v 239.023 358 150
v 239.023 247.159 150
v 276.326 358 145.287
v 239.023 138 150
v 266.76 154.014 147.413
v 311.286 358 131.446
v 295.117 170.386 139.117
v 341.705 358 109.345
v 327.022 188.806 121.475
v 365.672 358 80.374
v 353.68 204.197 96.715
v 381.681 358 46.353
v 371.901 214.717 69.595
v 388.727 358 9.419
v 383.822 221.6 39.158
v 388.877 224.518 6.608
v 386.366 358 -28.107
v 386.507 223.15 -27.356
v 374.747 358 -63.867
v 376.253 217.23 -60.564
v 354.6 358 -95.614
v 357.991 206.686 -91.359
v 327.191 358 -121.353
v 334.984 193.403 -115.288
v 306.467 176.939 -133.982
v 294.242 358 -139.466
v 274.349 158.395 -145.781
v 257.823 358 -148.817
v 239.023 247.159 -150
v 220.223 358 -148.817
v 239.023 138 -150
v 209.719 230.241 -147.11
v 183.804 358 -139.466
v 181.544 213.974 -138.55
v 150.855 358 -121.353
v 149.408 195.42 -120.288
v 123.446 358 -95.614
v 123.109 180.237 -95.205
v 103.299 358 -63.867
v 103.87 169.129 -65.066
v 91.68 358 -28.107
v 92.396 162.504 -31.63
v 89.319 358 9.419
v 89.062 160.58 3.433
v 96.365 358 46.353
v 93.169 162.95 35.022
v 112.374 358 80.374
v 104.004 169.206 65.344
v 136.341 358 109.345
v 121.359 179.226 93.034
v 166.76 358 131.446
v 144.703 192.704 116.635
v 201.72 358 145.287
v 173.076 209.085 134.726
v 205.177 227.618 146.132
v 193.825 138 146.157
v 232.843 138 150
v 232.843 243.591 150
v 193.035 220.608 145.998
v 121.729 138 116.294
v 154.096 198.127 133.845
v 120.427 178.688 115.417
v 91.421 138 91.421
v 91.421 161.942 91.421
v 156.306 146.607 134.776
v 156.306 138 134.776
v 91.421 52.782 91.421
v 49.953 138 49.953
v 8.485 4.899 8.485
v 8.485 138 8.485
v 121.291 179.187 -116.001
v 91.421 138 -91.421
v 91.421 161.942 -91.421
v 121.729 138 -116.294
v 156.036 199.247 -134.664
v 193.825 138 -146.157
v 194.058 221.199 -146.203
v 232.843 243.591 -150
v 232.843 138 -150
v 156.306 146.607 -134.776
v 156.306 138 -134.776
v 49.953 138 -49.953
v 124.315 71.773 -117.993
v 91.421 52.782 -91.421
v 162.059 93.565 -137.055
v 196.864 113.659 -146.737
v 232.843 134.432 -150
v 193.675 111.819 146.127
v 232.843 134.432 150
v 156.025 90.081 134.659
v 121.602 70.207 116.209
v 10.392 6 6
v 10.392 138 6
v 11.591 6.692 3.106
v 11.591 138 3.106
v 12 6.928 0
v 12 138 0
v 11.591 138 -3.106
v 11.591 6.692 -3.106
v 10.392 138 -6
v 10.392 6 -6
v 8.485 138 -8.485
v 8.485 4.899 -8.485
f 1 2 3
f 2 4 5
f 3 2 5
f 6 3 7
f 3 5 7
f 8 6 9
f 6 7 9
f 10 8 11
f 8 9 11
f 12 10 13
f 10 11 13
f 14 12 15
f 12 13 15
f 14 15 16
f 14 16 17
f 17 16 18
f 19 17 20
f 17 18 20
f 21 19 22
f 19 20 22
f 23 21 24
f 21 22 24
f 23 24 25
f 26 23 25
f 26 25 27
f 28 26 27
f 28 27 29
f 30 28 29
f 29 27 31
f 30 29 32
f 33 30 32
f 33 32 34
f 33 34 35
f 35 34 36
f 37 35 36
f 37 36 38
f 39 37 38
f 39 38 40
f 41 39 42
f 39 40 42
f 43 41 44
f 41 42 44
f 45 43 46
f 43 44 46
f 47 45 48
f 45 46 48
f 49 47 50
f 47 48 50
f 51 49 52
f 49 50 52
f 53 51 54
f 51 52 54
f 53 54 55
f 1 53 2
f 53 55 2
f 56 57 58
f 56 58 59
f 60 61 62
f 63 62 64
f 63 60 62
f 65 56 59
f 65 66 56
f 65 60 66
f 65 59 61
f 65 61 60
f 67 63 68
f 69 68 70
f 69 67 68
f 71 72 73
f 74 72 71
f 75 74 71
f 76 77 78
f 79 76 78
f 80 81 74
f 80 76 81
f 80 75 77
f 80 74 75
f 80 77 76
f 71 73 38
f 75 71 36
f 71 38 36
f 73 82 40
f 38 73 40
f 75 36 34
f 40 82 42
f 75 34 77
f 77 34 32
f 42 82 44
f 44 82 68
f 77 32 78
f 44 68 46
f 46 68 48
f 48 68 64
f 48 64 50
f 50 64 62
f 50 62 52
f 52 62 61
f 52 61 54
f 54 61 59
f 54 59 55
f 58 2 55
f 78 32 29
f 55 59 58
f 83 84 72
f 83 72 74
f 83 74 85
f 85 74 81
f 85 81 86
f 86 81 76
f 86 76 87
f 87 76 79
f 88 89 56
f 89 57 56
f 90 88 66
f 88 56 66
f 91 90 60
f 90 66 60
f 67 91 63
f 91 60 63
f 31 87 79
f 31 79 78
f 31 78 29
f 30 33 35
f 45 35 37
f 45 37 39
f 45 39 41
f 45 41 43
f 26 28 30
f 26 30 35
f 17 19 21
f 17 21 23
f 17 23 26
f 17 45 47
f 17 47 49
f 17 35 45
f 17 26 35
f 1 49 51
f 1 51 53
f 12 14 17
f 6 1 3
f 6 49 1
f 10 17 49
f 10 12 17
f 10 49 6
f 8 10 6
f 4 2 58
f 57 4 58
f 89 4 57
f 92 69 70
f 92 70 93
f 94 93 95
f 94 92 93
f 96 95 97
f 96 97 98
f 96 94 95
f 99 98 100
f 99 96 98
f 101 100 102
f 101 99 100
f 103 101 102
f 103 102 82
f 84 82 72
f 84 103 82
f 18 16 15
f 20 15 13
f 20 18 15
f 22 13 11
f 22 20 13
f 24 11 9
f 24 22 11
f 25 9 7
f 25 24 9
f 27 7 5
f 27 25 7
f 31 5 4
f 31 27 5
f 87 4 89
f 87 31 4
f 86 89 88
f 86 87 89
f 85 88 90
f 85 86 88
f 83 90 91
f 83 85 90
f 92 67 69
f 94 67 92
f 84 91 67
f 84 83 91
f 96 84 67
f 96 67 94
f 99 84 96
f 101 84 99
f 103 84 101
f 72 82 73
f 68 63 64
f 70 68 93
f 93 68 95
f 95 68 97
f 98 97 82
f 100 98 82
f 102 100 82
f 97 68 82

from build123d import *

# Parameters (mm, degrees)
BOSS_EXTRUDE1_DEPTH             = 138
SKETCH10_R                      = 150
BOSS_EXTRUDE6_DEPTH             = 220
BOSS_EXTRUDE6_DIRECTION_2_REACH = 314.006
SPLIT3_DEPTH                    = 76
FILLET2_R                       = 200
BOSS_EXTRUDE7_DEPTH             = 109.159437572


with BuildPart() as part:
    # Sketch1 → Boss-Extrude1 (new body)
    with BuildSketch(Plane(origin=(0, 0, 0), x_dir=(1, 0, 0), z_dir=(0, 1, 0))):
        with BuildLine():
            Line((8.485281374, 8.485281374), (150, 150))
            Line((150, 150), (278.911017507, 150))
            Line((278.911017507, 150), (278.911017507, -150))
            Line((278.911017507, -150), (150, -150))
            Line((150, -150), (8.485281374, -8.485281374))
            ThreePointArc((8.485281374, -8.485281374), (12, 0), (8.485281374, 8.485281374))
        make_face()
    extrude(amount=BOSS_EXTRUDE1_DEPTH)

    # Split1
    split(bisect_by=Plane(origin=(0, 0, 0), x_dir=(-0.8660254037844416, -0.49999999999999495, 0), z_dir=(0.49999999999999495, -0.8660254037844416, 0)), keep=Keep.BOTTOM)

    # Sketch10 → Boss-Extrude6 (add)
    with BuildSketch(Plane(origin=(0, 138, 0), x_dir=(1, 0, 0), z_dir=(0, 1, 0))):
        with Locations(Location((239.023011445, 0, 0), (0, 0, 270))):
            Circle(SKETCH10_R)
    extrude(amount=BOSS_EXTRUDE6_DEPTH)

    # Boss-Extrude6 direction 2: up to this face of the body (flat: up to its plane)
    boss_extrude6_direction_2_end = Plane(part.part.faces().sort_by_distance((151.627791868, 87.542346451, 0))[0])
    # Sketch10 → Boss-Extrude6 direction 2 (add, up to the picked face)
    with BuildSketch(Plane(origin=(0, 138, 0), x_dir=(1, 0, 0), z_dir=(0, 1, 0)), mode=Mode.PRIVATE) as boss_extrude6_direction_2_sk1:
        with Locations(Location((239.023011445, 0, 0), (0, 0, 270))):
            Circle(SKETCH10_R)
    boss_extrude6_direction_2_tool1 = split(extrude(boss_extrude6_direction_2_sk1.sketch, amount=-BOSS_EXTRUDE6_DIRECTION_2_REACH, mode=Mode.PRIVATE), bisect_by=boss_extrude6_direction_2_end, keep=Keep.BOTH, mode=Mode.PRIVATE)
    add(boss_extrude6_direction_2_tool1.solids().sort_by(Axis((239.023011, 138, 0), (0, -1, 0)))[0])

    # Split3: read off the stored shape, not the designer's step
    # Split3 outline → Split3 (cut)
    with BuildSketch(Plane(origin=(0, 0, 0), x_dir=(0.8660254037844416, 0.4999999999999948, 0), z_dir=(0.4999999999999948, -0.8660254037844417, 0))):
        with BuildLine():
            Line((173.205080757, -150), (276, -150))
            add(Edge.make_bspline(
                [(276, -150), (449.205080757, -150), (449.205080757, 0), (449.205080757, 150), (276, 150)],
                knots=[4.71238898, 4.71238898, 4.71238898, 6.283185307, 6.283185307, 7.853981634, 7.853981634, 7.853981634], degree=2, weights=[1, 0.707106781, 1, 0.707106781, 1]))
            Line((276, 150), (173.205080757, 150))
            Line((173.205080757, 150), (9.797958971, 8.485281374))
            add(Edge.make_bspline(
                [(9.797958971, -8.485281374), (19.595917942, 0), (9.797958971, 8.485281374)],
                knots=[2.35619449, 2.35619449, 2.35619449, 3.926990817, 3.926990817, 3.926990817], degree=2, weights=[1, 0.707106781, 1]))
            Line((9.797958971, -8.485281374), (173.205080757, -150))
        make_face()
    extrude(amount=SPLIT3_DEPTH, mode=Mode.SUBTRACT)

    # Fillet2
    fillet2_edges = [part.edges().sort_by_distance(p)[0] for p in [
        (150, 112.301270189, -150),
        (150, 112.301270189, 150),
    ]]
    fillet(fillet2_edges, radius=FILLET2_R)

    # Sketch12 → Boss-Extrude7 (add, along a direction that is not the sketch's normal)
    with BuildSketch(Plane(origin=(0, 0, 0), x_dir=(0.8660254037844417, 0.49999999999999495, 0), z_dir=(0.49999999999999495, -0.8660254037844417, 0))):
        with BuildLine():
            Line((9.797958971, -8.485281374), (105.564289267, -91.421356237))
            add(Edge.make_bspline(
                [(105.564289267, -91.421356237), (173.205080757, -150), (268.863605452, -150)],
                knots=[0.785398163, 0.785398163, 0.785398163, 1.570796327, 1.570796327, 1.570796327], degree=2, weights=[1, 0.923879533, 1]))
            Line((268.863605452, -150), (276, -150))
            add(Edge.make_bspline(
                [(276, -150), (449.205080757, -150), (449.205080757, 0), (449.205080757, 150), (276, 150)],
                knots=[4.71238898, 4.71238898, 4.71238898, 6.283185307, 6.283185307, 7.853981634, 7.853981634, 7.853981634], degree=2, weights=[1, 0.707106781, 1, 0.707106781, 1]))
            Line((276, 150), (268.863605452, 150))
            add(Edge.make_bspline(
                [(268.863605452, 150), (173.205080757, 150), (105.564289267, 91.421356237)],
                knots=[4.71238898, 4.71238898, 4.71238898, 5.497787144, 5.497787144, 5.497787144], degree=2, weights=[1, 0.923879533, 1]))
            Line((105.564289267, 91.421356237), (9.797958971, 8.485281374))
            add(Edge.make_bspline(
                [(9.797958971, -8.485281374), (19.595917942, 0), (9.797958971, 8.485281374)],
                knots=[2.35619449, 2.35619449, 2.35619449, 3.926990817, 3.926990817, 3.926990817], degree=2, weights=[1, 0.707106781, 1]))
        make_face()
    extrude(amount=-BOSS_EXTRUDE7_DEPTH, dir=(0, -1, 0))


solid = part.part
